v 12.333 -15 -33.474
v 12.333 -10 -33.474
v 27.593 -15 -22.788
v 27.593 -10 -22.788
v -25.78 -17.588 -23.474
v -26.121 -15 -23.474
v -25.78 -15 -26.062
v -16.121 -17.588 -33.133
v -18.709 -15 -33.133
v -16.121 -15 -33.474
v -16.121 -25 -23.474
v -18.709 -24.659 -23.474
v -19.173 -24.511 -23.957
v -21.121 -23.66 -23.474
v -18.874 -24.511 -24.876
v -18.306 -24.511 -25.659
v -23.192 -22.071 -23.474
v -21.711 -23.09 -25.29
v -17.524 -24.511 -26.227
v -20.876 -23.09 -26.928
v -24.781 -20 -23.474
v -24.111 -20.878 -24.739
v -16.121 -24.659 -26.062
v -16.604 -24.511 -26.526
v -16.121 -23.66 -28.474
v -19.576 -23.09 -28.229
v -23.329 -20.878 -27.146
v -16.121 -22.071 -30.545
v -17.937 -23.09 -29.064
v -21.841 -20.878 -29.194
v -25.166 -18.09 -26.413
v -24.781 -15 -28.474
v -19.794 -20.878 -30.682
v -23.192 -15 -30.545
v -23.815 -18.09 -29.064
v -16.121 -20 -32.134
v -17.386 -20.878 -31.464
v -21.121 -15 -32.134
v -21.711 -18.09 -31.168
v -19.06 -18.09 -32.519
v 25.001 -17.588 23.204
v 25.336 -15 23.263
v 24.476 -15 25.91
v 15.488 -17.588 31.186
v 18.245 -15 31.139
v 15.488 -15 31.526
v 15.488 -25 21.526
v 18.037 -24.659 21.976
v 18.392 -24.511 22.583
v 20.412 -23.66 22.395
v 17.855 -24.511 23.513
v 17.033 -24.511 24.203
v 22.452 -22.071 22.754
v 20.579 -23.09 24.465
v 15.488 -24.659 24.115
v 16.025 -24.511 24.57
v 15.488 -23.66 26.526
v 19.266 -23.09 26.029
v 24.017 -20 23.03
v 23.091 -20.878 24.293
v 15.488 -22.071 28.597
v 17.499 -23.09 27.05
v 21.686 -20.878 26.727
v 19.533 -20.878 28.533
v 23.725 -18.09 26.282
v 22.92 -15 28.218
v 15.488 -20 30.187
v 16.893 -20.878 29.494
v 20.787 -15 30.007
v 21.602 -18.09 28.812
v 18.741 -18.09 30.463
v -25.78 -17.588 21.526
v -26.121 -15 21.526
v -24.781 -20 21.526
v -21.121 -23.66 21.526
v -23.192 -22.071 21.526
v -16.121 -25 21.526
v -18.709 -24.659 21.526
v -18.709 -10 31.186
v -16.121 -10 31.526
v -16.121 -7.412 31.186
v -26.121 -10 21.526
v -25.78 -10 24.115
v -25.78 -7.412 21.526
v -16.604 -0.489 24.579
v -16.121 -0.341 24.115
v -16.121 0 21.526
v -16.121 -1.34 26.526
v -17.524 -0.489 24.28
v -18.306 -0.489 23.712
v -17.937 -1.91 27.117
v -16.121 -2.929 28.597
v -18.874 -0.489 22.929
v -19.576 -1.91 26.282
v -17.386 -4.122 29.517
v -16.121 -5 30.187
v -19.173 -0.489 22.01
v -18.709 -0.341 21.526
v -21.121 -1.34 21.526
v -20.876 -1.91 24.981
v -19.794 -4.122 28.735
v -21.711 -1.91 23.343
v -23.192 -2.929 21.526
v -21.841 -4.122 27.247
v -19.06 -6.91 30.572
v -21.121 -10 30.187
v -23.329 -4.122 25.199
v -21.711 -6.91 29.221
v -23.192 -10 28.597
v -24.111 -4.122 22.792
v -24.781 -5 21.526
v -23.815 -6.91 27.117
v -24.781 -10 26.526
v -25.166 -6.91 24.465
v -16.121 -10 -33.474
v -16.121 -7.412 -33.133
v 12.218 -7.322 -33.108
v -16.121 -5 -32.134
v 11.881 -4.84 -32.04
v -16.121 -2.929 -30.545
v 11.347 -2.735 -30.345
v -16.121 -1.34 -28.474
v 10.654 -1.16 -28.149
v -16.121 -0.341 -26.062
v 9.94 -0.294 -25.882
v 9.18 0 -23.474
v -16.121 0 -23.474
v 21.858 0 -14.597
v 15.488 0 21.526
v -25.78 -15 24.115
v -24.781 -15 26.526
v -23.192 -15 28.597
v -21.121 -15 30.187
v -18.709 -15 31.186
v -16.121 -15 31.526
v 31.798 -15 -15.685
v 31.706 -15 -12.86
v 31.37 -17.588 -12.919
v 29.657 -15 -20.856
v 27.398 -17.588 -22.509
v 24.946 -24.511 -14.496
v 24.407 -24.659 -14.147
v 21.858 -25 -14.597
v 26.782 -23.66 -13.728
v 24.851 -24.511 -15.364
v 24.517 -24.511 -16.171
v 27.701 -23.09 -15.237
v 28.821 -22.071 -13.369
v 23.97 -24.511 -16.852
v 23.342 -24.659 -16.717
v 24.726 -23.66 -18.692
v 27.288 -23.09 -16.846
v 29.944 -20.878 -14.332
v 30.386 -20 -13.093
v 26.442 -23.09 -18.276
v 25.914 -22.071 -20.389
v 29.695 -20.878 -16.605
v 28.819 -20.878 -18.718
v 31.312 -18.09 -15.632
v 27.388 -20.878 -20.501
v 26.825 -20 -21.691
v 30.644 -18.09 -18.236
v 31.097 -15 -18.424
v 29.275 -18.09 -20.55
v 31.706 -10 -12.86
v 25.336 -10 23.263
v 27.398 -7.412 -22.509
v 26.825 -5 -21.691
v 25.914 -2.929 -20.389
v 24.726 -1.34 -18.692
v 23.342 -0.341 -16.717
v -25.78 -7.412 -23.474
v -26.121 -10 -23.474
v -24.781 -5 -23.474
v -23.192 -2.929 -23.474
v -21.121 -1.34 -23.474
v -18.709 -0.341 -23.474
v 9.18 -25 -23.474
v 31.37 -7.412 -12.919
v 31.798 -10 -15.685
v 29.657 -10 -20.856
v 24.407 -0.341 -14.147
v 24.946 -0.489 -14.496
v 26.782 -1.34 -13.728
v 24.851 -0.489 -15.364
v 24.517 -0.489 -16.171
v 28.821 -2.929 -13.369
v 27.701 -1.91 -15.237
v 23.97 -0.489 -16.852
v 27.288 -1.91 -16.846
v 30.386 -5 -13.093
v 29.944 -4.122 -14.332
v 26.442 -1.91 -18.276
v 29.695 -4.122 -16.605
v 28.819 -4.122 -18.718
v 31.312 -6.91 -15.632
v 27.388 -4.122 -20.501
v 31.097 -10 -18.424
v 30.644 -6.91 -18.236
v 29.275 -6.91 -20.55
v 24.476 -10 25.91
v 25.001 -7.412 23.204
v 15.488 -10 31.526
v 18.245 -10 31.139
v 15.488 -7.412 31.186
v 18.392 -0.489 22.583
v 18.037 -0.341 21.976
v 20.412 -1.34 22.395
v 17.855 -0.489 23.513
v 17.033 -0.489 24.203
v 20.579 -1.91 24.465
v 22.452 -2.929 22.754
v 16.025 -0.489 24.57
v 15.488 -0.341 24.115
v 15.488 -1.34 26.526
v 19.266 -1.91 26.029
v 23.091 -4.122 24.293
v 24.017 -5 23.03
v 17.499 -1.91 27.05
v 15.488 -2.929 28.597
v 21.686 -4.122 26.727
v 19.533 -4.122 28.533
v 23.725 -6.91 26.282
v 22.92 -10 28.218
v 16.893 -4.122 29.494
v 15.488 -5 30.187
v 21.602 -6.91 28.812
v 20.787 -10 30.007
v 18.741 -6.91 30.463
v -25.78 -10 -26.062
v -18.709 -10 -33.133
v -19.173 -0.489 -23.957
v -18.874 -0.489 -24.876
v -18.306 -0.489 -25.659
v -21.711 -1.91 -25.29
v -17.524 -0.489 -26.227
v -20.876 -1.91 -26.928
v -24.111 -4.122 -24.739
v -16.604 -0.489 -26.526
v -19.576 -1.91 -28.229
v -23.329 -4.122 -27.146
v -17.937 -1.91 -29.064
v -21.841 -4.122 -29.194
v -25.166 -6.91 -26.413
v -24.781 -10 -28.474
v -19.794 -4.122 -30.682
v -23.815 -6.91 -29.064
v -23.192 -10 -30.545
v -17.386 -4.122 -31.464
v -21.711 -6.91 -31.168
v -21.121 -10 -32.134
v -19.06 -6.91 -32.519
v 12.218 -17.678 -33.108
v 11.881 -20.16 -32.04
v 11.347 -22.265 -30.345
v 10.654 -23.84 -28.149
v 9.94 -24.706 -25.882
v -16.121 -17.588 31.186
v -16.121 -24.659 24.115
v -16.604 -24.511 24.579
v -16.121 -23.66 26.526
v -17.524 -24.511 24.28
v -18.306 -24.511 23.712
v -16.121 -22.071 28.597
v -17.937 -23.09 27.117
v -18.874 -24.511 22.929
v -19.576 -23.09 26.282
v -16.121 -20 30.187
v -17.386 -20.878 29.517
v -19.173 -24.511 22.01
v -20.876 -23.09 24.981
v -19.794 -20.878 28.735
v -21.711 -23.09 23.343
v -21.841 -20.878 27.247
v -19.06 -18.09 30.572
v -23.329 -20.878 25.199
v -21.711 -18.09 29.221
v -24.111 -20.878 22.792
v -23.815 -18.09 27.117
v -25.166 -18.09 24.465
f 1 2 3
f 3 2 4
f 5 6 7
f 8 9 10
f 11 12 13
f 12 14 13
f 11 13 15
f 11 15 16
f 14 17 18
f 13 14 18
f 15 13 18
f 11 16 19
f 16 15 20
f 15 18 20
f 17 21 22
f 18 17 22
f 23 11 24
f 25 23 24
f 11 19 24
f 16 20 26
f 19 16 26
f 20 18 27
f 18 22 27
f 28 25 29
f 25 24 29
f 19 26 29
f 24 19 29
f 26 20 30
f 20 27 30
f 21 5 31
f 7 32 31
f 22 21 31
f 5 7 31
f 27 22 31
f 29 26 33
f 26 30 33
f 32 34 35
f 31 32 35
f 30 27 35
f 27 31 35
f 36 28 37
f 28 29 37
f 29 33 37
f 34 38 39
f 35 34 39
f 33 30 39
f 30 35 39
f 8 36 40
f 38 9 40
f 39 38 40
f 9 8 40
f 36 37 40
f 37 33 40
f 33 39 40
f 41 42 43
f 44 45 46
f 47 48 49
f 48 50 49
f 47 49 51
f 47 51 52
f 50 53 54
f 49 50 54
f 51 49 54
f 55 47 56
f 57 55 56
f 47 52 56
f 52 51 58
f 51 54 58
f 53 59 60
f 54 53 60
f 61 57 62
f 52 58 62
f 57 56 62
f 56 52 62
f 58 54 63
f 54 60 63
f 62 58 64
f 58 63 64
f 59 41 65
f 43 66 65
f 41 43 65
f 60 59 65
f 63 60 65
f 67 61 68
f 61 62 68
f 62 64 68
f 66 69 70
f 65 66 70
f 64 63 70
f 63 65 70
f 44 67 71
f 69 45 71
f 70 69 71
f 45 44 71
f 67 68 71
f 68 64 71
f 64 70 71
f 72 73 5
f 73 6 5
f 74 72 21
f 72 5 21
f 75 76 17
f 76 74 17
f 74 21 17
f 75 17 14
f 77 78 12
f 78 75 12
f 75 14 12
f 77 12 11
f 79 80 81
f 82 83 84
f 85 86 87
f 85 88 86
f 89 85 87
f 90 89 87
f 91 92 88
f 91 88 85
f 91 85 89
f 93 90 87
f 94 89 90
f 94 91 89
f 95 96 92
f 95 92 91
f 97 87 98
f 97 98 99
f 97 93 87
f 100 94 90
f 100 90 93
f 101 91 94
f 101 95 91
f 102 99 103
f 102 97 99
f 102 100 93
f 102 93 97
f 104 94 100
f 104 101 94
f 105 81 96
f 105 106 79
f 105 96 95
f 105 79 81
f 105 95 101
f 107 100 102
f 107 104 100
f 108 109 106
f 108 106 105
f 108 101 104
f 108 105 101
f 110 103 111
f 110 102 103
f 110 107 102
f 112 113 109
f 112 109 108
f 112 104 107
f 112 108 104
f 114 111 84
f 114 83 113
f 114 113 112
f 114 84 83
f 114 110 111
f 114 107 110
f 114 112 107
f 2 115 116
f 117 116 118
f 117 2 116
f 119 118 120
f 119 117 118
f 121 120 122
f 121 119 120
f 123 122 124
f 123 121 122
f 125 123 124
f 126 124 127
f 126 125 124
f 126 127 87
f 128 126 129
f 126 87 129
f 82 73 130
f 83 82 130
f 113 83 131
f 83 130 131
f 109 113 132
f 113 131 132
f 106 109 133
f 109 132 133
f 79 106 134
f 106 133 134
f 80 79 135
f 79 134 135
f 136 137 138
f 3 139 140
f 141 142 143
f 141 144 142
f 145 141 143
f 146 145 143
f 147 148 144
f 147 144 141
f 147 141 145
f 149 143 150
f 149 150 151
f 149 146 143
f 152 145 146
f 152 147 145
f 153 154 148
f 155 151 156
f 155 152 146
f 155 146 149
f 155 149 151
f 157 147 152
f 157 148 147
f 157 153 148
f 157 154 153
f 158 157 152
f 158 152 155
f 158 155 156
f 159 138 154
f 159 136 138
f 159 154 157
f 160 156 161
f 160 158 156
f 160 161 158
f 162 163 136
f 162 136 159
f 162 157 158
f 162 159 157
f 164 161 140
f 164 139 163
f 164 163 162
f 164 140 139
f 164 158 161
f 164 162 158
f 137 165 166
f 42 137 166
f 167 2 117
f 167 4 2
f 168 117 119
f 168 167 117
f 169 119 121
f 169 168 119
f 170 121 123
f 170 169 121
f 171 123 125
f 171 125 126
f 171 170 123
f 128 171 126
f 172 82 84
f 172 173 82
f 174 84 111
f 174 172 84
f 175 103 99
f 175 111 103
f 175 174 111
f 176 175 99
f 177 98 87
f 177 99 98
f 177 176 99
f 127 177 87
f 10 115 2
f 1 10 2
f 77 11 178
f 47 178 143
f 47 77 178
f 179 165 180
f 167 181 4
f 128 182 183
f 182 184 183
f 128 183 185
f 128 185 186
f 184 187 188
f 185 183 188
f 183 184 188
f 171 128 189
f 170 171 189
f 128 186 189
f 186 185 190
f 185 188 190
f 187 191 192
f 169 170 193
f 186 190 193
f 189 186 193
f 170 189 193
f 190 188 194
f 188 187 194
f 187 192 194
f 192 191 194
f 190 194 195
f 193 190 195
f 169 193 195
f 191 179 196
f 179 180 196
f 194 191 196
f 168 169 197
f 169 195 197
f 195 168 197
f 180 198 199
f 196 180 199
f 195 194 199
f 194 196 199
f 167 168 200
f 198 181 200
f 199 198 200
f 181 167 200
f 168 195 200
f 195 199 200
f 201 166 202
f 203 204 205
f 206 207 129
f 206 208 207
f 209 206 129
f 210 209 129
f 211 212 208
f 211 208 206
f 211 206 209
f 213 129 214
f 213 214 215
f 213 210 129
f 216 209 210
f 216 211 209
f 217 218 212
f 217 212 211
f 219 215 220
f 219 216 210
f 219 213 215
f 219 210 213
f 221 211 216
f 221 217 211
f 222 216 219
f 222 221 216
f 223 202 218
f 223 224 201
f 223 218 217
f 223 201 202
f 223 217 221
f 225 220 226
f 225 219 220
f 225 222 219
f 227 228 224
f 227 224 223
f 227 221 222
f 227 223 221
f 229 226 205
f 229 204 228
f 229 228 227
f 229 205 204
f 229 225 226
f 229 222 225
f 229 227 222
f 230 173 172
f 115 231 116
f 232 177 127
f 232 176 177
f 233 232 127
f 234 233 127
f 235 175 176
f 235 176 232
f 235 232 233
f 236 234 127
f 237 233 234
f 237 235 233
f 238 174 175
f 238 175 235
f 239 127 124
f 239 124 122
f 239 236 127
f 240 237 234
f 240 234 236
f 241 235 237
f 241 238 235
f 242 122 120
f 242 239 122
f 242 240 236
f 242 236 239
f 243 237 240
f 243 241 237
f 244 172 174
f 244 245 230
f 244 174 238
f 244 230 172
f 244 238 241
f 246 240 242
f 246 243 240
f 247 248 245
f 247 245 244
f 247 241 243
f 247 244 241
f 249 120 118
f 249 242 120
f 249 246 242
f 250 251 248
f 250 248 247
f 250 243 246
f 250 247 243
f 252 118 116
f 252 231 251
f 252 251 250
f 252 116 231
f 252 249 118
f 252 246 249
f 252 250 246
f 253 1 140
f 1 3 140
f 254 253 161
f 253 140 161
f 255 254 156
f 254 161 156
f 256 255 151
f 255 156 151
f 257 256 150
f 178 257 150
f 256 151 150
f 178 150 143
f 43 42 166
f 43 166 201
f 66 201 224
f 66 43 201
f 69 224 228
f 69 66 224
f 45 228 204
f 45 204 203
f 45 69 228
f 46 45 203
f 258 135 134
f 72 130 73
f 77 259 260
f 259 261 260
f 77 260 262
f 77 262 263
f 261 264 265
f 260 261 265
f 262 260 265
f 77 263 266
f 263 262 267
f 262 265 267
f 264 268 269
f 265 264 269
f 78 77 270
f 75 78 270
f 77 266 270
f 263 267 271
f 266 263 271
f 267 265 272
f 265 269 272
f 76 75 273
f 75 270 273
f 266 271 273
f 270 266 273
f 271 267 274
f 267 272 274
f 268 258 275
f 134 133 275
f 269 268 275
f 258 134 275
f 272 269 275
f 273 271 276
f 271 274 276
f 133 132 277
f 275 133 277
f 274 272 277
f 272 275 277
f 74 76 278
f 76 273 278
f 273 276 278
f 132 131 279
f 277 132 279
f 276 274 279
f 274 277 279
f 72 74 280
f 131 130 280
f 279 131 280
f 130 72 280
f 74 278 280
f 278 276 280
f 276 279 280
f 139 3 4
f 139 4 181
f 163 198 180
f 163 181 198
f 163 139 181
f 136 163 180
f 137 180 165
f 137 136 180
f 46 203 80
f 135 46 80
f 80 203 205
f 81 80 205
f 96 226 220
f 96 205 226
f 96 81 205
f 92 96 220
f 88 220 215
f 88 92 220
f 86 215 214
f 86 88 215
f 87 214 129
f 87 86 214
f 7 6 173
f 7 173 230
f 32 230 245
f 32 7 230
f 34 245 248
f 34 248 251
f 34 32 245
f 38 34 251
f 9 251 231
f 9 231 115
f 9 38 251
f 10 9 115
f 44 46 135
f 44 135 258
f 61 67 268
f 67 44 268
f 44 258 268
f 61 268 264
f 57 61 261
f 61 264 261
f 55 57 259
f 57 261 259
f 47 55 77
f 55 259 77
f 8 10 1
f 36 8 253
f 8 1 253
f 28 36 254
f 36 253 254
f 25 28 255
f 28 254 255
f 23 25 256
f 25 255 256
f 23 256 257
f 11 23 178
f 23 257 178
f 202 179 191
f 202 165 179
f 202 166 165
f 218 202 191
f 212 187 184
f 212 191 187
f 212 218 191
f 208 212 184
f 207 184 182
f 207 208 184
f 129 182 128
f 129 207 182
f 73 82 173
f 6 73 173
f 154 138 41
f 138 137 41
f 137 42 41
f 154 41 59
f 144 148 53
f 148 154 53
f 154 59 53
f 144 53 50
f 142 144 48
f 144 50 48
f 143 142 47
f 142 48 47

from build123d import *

# Parameters (mm, degrees)
F1_DEPTH = 25
F2_R     = 10


with BuildPart() as f1:
    # F0 (on Front) → F1 (new body)
    with BuildSketch(Plane.XZ):
        Polygon((-26.120773, 31.526426), (-26.120773, -33.473574), (12.333255, -33.473574), (32.812056, -19.134163), (23.879227, 31.526426), align=None)
    extrude(amount=F1_DEPTH)

    # F2
    f2_edges = [f1.edges().sort_by_distance(p)[0] for p in [
        (23.879227, -12.5, 31.526426),
        (32.812056, -12.5, -19.134163),
        (-26.120773, -12.5, 31.526426),
        (-26.120773, -12.5, -33.473574),
        (28.345642, -25, 6.196132),
        (-1.120773, -25, 31.526426),
        (-26.120773, -25, -0.973574),
        (-6.893759, -25, -33.473574),
        (22.572655, -25, -26.303868),
        (28.345642, 0, 6.196132),
        (-1.120773, 0, 31.526426),
        (-26.120773, 0, -0.973574),
        (-6.893759, 0, -33.473574),
        (22.572655, 0, -26.303868),
    ]]
    fillet(f2_edges, radius=F2_R)


solid = f1.part
